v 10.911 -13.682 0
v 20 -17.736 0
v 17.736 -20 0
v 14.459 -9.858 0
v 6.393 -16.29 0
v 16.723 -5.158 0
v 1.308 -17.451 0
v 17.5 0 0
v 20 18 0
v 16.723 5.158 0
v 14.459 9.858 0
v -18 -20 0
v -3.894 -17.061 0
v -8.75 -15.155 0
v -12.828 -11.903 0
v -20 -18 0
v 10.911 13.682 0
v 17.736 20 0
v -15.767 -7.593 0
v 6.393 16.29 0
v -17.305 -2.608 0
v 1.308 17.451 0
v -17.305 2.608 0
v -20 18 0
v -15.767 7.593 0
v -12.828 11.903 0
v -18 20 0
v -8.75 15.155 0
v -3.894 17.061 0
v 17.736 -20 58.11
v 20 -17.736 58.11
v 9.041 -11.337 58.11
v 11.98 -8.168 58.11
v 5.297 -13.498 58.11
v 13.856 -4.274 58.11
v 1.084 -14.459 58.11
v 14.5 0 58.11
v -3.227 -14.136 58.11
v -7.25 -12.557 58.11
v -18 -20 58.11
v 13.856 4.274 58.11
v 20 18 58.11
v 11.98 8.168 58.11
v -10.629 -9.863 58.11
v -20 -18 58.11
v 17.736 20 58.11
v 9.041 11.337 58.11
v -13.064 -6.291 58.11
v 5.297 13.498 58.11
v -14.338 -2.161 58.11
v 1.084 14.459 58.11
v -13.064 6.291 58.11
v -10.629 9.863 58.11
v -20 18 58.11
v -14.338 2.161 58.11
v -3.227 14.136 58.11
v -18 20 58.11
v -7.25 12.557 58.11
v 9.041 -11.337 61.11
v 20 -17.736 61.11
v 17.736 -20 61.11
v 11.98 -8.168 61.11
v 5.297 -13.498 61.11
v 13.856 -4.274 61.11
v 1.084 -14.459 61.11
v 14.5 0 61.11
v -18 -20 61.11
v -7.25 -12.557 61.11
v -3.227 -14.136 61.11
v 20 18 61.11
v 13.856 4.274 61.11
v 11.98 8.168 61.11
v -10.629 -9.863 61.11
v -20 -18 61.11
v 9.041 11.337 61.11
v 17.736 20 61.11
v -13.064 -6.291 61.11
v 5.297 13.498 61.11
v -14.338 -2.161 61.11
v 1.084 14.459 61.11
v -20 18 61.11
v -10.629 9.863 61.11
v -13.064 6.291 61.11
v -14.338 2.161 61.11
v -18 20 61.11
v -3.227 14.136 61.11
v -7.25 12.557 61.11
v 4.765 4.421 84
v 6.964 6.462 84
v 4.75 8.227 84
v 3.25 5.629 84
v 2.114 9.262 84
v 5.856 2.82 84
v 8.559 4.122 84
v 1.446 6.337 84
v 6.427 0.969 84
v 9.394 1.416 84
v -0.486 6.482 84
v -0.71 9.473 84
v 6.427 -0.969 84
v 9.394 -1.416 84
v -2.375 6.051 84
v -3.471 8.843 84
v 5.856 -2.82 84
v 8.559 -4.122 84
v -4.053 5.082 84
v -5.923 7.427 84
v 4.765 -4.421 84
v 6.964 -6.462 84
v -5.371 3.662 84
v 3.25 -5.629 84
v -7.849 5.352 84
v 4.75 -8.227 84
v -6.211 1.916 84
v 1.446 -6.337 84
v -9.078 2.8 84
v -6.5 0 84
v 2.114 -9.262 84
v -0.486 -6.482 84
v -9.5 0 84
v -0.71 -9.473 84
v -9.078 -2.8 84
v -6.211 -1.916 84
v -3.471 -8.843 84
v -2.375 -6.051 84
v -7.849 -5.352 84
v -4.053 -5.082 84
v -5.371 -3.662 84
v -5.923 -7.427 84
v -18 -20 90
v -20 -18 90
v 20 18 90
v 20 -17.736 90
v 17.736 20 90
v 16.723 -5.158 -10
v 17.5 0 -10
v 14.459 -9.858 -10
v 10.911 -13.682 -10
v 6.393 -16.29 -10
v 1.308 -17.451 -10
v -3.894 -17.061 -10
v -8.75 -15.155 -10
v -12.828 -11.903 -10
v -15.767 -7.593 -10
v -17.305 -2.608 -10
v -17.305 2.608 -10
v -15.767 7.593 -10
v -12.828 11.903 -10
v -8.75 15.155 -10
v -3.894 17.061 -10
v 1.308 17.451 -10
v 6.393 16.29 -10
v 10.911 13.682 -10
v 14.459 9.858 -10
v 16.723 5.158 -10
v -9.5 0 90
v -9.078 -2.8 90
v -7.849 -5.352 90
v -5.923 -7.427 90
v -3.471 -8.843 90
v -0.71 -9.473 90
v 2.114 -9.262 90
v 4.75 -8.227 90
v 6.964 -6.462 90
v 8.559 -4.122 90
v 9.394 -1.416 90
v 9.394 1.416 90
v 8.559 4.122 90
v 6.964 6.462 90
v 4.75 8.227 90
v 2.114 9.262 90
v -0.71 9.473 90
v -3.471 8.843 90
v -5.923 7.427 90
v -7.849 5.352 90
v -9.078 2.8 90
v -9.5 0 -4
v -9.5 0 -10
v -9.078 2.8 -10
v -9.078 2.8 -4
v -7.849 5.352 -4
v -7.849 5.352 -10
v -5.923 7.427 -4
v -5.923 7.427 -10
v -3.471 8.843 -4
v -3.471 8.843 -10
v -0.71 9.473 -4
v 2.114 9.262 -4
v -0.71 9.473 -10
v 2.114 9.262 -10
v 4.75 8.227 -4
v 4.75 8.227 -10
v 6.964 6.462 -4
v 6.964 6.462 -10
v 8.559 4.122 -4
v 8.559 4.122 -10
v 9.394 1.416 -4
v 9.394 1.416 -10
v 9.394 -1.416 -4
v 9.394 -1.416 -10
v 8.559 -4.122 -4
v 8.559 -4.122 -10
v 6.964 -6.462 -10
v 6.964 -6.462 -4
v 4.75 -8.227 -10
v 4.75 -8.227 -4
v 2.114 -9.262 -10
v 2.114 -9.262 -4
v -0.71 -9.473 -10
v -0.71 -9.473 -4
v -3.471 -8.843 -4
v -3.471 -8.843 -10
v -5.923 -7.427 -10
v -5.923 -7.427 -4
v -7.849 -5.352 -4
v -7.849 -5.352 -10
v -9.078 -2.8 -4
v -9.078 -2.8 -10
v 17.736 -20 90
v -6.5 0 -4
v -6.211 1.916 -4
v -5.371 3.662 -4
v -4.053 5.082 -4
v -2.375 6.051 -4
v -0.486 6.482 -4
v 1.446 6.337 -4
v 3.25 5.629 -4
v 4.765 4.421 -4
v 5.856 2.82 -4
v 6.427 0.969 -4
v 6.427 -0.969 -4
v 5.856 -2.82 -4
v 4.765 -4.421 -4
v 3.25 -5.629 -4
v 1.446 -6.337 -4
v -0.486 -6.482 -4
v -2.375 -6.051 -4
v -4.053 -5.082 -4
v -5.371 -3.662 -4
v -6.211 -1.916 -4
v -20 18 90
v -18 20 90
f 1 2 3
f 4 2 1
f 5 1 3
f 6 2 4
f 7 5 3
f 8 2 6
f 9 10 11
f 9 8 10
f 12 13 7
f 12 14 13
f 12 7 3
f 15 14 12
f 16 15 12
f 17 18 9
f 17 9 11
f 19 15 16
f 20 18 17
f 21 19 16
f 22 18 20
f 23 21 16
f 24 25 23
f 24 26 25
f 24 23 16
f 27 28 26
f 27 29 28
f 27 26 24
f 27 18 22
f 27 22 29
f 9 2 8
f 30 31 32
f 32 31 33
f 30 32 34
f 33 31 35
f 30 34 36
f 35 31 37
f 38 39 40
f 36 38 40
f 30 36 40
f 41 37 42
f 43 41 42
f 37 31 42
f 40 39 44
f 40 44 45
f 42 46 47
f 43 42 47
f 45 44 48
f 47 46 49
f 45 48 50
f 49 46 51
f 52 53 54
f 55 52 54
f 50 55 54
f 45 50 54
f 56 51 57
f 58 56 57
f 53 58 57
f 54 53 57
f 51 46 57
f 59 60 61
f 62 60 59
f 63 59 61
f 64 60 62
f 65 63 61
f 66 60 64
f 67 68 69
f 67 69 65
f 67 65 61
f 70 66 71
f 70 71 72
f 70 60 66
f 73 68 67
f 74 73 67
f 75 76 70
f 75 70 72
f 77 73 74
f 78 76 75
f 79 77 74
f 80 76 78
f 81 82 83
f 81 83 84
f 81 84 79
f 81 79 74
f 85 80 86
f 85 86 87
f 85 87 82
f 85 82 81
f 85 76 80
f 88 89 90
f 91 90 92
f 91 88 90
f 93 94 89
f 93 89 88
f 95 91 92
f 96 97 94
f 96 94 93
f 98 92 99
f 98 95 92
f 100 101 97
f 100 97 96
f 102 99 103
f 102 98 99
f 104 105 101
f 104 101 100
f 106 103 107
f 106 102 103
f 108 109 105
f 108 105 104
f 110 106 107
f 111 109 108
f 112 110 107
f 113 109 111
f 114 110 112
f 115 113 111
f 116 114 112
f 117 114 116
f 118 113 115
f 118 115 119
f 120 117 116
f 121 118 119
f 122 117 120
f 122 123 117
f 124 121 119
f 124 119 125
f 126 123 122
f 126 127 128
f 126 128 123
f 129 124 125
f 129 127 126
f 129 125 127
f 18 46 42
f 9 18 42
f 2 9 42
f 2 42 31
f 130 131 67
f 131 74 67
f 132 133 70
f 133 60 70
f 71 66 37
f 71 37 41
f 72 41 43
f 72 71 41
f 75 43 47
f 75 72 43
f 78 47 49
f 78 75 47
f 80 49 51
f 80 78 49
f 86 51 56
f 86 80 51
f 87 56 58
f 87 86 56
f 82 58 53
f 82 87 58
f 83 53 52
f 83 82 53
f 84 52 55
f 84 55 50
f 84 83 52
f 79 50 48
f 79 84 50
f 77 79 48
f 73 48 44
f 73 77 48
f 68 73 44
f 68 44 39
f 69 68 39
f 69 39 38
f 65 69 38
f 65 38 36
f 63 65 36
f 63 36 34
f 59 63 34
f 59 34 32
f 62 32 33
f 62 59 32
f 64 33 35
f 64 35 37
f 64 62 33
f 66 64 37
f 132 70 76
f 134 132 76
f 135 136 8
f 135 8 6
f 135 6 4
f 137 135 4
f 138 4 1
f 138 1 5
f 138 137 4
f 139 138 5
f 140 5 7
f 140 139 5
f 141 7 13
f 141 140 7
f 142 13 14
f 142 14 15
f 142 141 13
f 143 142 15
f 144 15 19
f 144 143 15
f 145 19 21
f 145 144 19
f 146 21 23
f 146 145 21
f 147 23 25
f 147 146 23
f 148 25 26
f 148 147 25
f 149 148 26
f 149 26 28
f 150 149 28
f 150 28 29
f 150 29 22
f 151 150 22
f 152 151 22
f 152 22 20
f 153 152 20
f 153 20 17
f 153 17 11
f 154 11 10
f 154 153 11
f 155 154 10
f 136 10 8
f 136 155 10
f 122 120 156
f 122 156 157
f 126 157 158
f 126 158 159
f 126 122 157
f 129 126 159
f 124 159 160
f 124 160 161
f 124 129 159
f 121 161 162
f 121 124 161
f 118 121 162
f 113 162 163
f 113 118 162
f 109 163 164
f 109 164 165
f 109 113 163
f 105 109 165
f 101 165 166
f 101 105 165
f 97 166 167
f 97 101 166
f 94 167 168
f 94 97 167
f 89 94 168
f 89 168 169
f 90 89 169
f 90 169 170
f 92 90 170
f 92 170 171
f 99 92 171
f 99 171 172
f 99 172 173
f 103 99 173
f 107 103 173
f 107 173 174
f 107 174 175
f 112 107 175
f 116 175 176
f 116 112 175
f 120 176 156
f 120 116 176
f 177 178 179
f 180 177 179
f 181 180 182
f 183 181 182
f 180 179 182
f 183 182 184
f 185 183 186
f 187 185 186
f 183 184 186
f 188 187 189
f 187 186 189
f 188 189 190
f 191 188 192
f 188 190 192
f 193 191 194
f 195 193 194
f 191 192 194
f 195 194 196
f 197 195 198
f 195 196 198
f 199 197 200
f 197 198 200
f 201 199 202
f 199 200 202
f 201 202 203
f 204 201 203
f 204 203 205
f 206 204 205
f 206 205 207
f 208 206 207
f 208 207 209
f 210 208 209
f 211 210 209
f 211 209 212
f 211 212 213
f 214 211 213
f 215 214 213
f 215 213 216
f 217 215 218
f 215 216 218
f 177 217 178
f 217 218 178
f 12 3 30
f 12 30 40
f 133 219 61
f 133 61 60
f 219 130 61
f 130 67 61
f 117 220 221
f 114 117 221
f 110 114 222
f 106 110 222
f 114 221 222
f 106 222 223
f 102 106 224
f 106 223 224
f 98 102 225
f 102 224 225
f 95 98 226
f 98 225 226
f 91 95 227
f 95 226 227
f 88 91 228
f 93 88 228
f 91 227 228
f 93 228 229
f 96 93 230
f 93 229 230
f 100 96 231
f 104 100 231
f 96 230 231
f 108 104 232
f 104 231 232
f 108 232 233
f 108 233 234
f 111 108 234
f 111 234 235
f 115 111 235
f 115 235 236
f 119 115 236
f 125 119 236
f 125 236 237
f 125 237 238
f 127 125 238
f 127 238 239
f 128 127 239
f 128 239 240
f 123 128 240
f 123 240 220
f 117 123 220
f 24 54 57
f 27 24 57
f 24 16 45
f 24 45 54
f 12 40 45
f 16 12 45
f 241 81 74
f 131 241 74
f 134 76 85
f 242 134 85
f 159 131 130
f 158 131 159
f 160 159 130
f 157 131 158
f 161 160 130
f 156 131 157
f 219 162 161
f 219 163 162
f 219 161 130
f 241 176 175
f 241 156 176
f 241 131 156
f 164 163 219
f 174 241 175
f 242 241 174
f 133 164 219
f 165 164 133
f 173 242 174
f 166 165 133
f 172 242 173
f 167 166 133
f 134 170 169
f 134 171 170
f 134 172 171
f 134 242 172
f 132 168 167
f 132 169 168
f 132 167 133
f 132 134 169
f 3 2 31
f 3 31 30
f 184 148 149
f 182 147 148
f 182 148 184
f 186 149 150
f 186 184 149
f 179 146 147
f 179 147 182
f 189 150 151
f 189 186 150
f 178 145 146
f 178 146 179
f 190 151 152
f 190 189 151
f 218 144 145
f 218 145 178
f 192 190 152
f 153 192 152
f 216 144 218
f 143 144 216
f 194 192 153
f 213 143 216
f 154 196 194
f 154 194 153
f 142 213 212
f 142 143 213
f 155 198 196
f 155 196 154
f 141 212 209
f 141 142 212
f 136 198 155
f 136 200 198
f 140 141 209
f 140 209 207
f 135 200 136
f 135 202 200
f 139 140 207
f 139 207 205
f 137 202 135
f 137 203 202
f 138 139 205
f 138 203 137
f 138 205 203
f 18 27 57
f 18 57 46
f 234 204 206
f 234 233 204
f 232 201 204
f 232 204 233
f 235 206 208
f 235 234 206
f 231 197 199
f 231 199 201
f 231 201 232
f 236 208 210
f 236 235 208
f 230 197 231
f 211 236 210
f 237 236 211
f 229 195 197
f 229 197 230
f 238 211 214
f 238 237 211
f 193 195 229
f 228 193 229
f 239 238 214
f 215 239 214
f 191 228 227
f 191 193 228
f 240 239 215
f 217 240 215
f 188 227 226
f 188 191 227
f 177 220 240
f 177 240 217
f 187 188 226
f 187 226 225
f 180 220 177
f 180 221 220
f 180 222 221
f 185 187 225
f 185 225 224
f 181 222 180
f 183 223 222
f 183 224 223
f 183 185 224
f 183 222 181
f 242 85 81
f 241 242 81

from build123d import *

# Parameters (mm, degrees)
EXTRUDE_1_DEPTH     = 80
SKETCH_3_R          = 17.5
EXTRUDE_2_DEPTH     = 10
EXTRUDE_START       = 10
SKETCH_4_R          = 17.5
EXTRUDE_3_DEPTH     = 10
SKETCH_6_R          = 9.5
CUT_EXTRUDE_3_DEPTH = 6
CUT_EXTRUDE_START   = -6
SKETCH_7_R          = 9.5
CUT_EXTRUDE_4_DEPTH = 6
SKETCH_8_R          = 6.5
CUT_EXTRUDE_5_DEPTH = 100
SKETCH_11_R         = 14.5
CUT_EXTRUDE_8_DEPTH = 3
SKETCH_13_R         = 17.5
EXTRUDE_5_DEPTH     = 10


with BuildPart() as part:
    # 草图1 → 凸台-拉伸1 (new body)
    with BuildSketch(Plane.XY):
        Polygon((-20, 18), (-18, 20), (17.735809733, 20), (20, 18), (20, -17.735809733), (17.735809733, -20), (-18, -20), (-20, -18), align=None)
    extrude(amount=EXTRUDE_1_DEPTH)

    # 草图3 → 凸台-拉伸2 (add)
    with BuildSketch(Plane.XY.offset(80)):
        Circle(SKETCH_3_R)
    extrude(amount=EXTRUDE_2_DEPTH)

    # 草图4 → 凸台-拉伸3 (add)
    with BuildSketch(Plane(origin=(0, 0, 0), x_dir=(-1, 0, 0), z_dir=(0, 0, -1)).offset(EXTRUDE_START)):
        with Locations(Location((0, 0, 0), (0, 0, 180))):
            Circle(SKETCH_4_R)
    extrude(amount=-EXTRUDE_3_DEPTH)

    # 草图6 → 切除-拉伸3 (cut)
    with BuildSketch(Plane(origin=(0, 0, -10), x_dir=(-1, 0, 0), z_dir=(0, 0, -1))):
        Circle(SKETCH_6_R)
    extrude(amount=-CUT_EXTRUDE_3_DEPTH, mode=Mode.SUBTRACT)

    # 草图7 → 切除-拉伸4 (cut)
    with BuildSketch(Plane.XY.offset(90).offset(CUT_EXTRUDE_START)):
        with Locations(Location((0, 0, 0), (0, 0, 180))):
            Circle(SKETCH_7_R)
    extrude(amount=CUT_EXTRUDE_4_DEPTH, mode=Mode.SUBTRACT)

    # 草图8 → 切除-拉伸5 (cut)
    with BuildSketch(Plane(origin=(0, 0, -10), x_dir=(-1, 0, 0), z_dir=(0, 0, -1))):
        Circle(SKETCH_8_R)
    extrude(amount=-CUT_EXTRUDE_5_DEPTH, mode=Mode.SUBTRACT)

    # 草图11 → 切除-拉伸8 (cut)
    with BuildSketch(Plane.XY.offset(61.11)):
        Polygon((17.735809733, -20), (-18, -20), (-20, -18), (-20, 18), (-18, 20), (17.735809733, 20), (20, 18), (20, -17.735809733), align=None)
        Circle(SKETCH_11_R, mode=Mode.SUBTRACT)
    extrude(amount=-CUT_EXTRUDE_8_DEPTH, mode=Mode.SUBTRACT)

    # 草图13 → 凸台-拉伸5 (add)
    with BuildSketch(Plane.XY.offset(80)):
        Polygon((-20, 18), (-20, -18), (-18, -20), (17.735809733, -20), (20, -17.735809733), (20, 18), (17.735809733, 20), (-18, 20), align=None)
        with Locations(Location((0, 0, 0), (0, 0, 180))):
            Circle(SKETCH_13_R, mode=Mode.SUBTRACT)
    extrude(amount=EXTRUDE_5_DEPTH)


solid = part.part
